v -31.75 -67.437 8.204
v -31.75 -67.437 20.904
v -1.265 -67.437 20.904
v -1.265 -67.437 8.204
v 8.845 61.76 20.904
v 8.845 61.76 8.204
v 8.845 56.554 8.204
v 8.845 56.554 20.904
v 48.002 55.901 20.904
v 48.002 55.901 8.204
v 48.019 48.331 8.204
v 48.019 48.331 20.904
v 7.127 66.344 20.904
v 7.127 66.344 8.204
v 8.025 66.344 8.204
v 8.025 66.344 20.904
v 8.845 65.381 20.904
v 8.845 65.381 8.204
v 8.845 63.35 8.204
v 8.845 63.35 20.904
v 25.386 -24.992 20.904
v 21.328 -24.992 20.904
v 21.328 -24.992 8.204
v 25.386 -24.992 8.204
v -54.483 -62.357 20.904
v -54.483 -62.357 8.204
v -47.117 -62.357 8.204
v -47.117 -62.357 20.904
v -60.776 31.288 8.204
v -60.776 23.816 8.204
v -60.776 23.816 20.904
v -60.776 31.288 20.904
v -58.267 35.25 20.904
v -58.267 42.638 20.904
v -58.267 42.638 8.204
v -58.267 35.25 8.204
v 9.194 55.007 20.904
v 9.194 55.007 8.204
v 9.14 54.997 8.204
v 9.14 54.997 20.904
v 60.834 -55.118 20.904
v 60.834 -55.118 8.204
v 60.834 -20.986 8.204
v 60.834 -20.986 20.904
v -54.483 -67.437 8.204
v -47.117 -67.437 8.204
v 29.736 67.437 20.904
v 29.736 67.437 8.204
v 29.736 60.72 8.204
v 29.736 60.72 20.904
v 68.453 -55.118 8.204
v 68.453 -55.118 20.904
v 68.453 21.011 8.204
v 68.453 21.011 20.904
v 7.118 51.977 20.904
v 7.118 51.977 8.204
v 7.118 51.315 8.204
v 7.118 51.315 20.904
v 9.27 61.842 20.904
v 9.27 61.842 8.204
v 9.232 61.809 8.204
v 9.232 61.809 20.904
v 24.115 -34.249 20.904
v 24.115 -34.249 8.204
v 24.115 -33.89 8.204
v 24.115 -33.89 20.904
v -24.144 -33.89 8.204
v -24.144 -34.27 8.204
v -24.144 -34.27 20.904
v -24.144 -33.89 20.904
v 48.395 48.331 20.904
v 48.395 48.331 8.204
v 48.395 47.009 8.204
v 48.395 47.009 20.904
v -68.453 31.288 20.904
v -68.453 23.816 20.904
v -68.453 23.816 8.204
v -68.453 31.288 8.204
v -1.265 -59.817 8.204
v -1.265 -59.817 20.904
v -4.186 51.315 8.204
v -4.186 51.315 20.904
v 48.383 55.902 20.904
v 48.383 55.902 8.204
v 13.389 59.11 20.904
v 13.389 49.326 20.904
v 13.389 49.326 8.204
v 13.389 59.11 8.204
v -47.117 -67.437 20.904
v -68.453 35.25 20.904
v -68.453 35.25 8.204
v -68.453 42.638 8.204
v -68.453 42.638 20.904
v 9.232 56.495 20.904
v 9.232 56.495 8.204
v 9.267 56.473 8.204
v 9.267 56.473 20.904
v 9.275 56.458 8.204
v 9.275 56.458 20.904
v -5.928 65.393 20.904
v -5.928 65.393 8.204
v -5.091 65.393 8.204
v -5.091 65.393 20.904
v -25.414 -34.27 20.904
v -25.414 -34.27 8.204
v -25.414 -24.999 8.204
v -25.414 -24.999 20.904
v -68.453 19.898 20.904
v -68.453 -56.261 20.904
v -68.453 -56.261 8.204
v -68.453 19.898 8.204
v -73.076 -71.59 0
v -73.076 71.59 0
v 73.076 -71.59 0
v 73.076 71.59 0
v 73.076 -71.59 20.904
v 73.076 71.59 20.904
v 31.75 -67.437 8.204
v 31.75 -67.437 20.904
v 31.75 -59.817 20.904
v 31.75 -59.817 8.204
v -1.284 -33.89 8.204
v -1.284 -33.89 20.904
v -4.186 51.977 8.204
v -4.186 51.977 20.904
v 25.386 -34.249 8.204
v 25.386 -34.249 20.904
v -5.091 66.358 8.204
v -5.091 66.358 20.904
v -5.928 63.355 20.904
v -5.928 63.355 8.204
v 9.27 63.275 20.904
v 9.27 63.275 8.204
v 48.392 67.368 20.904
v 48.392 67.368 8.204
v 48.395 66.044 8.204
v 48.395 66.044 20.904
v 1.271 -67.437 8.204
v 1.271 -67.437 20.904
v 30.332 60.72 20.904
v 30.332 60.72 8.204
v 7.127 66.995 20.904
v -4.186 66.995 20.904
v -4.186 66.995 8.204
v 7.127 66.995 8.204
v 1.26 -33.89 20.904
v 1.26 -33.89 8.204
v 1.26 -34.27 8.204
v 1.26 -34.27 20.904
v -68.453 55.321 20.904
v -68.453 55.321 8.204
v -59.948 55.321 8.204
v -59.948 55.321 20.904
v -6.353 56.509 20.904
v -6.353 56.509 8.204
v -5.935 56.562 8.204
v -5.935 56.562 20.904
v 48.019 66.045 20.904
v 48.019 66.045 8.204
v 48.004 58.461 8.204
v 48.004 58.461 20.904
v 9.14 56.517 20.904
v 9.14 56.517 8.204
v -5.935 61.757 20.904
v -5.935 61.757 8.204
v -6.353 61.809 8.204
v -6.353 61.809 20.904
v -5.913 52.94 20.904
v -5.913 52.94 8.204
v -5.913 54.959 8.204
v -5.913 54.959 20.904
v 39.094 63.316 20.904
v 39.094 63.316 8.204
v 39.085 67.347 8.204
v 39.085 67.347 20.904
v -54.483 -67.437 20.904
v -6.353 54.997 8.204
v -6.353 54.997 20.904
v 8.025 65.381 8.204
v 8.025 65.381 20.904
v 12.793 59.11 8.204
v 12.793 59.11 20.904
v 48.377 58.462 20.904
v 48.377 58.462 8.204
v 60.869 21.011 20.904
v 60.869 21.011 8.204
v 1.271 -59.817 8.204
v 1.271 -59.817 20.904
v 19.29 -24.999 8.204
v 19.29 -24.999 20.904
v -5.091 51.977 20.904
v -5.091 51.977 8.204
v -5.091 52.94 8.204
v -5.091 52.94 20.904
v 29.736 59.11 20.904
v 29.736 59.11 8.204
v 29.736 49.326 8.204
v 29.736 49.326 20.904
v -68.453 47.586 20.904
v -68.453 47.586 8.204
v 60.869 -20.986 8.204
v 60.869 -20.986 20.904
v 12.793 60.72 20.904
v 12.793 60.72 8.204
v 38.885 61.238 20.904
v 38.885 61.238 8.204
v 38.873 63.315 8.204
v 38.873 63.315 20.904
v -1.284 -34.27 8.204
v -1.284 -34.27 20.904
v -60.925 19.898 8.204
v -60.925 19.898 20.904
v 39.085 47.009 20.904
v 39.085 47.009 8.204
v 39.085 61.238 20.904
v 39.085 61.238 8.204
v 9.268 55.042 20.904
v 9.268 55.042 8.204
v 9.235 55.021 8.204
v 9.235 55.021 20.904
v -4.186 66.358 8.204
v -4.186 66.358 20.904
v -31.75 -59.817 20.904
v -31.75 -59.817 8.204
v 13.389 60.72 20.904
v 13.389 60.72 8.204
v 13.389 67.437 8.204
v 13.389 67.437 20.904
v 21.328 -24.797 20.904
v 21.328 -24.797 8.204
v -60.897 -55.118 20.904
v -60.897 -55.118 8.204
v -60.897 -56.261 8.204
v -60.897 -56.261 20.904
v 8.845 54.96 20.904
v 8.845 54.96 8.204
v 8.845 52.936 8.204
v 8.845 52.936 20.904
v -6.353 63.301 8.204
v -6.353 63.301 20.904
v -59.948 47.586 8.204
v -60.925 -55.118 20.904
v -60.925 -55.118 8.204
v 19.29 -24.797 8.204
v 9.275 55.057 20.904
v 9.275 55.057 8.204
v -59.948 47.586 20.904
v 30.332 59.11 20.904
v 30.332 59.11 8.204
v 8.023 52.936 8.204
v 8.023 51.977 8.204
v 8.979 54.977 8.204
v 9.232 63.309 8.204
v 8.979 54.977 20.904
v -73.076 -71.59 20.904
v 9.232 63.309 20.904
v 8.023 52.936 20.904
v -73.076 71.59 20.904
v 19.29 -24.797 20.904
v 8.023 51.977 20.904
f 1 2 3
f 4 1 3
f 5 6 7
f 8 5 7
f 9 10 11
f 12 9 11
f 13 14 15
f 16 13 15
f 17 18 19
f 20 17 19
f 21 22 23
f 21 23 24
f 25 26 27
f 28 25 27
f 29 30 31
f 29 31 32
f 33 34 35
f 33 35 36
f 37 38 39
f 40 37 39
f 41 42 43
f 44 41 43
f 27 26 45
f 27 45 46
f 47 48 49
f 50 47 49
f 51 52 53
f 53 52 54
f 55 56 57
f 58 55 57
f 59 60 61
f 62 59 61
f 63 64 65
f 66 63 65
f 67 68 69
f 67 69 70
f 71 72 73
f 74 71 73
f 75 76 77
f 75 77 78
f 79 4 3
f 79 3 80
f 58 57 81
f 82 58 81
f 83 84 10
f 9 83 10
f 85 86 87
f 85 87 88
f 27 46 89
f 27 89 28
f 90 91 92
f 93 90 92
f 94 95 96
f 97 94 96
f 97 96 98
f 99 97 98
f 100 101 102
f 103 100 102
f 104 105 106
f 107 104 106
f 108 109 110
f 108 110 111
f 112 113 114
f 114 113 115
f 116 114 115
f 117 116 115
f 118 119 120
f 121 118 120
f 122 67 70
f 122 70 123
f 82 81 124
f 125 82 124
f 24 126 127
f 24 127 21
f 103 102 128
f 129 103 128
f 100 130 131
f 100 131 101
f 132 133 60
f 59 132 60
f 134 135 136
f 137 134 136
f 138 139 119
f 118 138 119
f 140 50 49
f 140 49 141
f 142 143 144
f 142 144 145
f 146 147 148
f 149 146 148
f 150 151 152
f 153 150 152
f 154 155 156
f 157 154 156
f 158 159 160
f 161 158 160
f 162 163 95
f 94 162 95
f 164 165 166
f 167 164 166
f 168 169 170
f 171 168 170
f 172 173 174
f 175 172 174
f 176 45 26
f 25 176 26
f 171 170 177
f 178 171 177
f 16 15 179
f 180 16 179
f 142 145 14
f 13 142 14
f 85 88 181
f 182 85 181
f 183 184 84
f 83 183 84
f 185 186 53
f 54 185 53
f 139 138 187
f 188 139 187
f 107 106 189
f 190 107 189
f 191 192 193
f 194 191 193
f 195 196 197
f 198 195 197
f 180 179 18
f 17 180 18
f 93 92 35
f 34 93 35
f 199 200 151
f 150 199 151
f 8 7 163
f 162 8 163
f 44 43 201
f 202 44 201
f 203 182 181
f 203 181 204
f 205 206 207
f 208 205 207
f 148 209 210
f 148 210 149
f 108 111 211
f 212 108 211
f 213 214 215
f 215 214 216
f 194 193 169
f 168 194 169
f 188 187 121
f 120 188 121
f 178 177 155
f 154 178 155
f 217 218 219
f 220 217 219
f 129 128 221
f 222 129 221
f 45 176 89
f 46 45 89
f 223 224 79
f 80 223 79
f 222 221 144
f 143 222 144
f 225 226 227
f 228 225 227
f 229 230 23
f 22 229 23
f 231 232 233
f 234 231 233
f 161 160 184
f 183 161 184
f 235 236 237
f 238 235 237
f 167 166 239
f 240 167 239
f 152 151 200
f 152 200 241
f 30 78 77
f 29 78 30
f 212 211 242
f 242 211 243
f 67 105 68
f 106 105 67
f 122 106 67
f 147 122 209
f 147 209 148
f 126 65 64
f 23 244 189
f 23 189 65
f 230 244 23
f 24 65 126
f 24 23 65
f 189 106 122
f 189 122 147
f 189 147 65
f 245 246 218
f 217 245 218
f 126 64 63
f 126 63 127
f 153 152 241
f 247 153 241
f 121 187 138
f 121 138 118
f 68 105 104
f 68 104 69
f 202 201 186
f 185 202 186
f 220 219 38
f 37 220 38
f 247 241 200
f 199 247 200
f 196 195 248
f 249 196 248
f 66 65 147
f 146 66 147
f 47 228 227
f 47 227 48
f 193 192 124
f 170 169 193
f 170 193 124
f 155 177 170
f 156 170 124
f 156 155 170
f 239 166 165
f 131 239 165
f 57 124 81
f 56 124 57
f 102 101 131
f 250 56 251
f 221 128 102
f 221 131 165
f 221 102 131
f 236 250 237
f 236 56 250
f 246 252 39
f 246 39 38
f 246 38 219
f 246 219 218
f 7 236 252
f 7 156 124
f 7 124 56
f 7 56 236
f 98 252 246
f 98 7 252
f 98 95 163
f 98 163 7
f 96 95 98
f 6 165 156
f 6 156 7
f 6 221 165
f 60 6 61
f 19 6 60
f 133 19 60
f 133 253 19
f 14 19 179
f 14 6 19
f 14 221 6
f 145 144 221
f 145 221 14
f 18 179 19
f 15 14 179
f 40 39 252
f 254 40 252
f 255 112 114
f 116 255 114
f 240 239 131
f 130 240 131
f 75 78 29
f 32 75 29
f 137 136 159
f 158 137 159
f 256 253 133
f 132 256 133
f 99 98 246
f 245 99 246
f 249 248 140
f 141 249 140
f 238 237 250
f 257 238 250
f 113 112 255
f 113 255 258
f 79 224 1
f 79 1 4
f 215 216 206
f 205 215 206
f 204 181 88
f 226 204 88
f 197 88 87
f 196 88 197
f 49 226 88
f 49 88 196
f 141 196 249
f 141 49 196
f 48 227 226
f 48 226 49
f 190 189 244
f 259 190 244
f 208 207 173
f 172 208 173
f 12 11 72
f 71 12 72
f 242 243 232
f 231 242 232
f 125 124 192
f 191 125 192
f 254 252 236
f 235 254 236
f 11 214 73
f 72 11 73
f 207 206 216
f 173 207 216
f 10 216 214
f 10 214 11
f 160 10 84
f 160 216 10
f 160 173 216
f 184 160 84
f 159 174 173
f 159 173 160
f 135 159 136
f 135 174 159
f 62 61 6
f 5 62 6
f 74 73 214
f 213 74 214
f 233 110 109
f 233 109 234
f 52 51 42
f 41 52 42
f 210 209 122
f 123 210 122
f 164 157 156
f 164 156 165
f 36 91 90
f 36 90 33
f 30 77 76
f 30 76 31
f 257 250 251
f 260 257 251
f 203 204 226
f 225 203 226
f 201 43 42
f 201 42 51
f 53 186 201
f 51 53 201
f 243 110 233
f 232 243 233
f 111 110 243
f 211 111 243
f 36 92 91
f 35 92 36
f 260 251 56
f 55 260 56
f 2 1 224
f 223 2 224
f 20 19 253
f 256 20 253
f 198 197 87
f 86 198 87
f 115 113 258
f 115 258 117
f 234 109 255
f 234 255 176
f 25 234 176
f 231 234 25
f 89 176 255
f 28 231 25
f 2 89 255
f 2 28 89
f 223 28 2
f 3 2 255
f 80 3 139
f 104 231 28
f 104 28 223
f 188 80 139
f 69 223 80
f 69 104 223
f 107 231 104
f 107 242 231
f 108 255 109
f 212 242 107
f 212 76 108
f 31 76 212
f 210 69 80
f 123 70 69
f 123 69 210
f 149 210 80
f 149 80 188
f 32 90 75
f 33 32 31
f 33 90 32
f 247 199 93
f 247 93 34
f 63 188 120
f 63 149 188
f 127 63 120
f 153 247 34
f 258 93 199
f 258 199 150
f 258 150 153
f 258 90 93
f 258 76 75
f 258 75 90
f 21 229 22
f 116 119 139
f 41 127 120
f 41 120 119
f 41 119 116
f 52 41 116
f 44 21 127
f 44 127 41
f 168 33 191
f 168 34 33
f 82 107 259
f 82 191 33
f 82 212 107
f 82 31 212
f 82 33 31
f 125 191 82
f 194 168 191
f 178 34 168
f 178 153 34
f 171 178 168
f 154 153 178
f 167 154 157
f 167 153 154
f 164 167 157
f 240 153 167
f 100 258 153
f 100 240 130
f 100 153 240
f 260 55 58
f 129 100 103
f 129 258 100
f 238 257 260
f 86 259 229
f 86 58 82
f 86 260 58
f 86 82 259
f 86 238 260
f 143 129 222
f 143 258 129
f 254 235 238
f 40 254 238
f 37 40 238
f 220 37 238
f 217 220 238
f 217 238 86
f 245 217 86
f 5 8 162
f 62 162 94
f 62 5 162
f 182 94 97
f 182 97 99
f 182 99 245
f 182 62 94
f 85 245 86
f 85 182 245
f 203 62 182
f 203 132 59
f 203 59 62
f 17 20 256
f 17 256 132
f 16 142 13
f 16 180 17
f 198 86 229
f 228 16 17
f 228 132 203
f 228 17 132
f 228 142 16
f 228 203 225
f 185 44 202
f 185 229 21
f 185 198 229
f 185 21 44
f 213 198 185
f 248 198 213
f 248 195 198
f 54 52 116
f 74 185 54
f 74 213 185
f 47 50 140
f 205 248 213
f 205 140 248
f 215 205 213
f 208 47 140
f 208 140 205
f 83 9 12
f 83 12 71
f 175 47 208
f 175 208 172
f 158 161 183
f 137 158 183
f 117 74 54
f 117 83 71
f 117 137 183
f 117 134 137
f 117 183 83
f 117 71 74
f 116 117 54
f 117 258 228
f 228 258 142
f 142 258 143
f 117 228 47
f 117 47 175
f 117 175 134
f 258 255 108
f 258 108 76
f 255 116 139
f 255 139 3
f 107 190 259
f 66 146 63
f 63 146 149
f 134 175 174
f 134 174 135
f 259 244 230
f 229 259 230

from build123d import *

# Parameters (mm, degrees)
F0_W      = 146.1516
F0_H      = 143.1798
F1_DEPTH  = 20.9042
F2_W      = 136.906
F2_H      = 134.874
F3_DEPTH  = 12.7
F4_W      = 13.97
F4_H      = 11.176
F5_DEPTH  = 12.7
F6_W      = 22.733
F6_H      = 6.096
F7_DEPTH  = 12.7
F8_W      = 15.367
F8_H      = 5.08
F9_DEPTH  = 12.7
F10_W     = 36.703
F10_H     = 12.319
F11_DEPTH = 12.7
F13_DEPTH = 12.7
F14_W     = 22.83968
F14_H     = 21.22805
F15_DEPTH = 12.7
F16_W     = 3.0399242607
F16_H     = 20.8479667597
F17_DEPTH = 12.7
F19_DEPTH = 12.7
F20_W     = 0.0204666441
F20_H     = 21.22805
F21_DEPTH = 12.7
F22_W     = 36.7188937962
F22_H     = 20.8685005598
F23_DEPTH = 12.7
F24_W     = 35.306
F24_H     = 13.2634267211
F25_DEPTH = 12.7
F27_DEPTH = 12.7
F28_W     = 1.4742958935
F28_H     = 20.8479667597
F29_DEPTH = 12.7
F30_W     = 0.2049181255
F30_H     = 13.2839605212
F31_DEPTH = 12.7
F32_W     = 50.9417812916
F32_H     = 3.8105603307
F33_DEPTH = 12.7
F34_W     = 0.1417576911
F34_H     = 9.2577636242
F35_DEPTH = 12.7
F36_W     = 44.7041876614
F36_H     = 0.2025440335
F37_DEPTH = 12.7
F38_W     = 8.9374343662
F38_H     = 3.9174016565
F39_DEPTH = 12.7
F40_W     = 127.9685656338
F40_H     = 2.8044246137
F41_DEPTH = 12.7
F42_W     = 120.384439826
F42_H     = 1.1129770428
F43_DEPTH = 12.7
F45_DEPTH = 12.7
F46_W     = 12.3281155104
F46_H     = 3.9624
F47_DEPTH = 12.7
F48_W     = 4.6508648958
F48_H     = 7.4722463233
F49_DEPTH = 12.7
F51_DEPTH = 12.7
F52_W     = 0.5965952
F52_H     = 1.6107708216
F53_DEPTH = 12.7
F55_DEPTH = 12.7
F57_DEPTH = 12.7
F58_DEPTH = 12.7
F59_W     = 18.6266698875
F59_H     = 19.8514753814
F60_DEPTH = 12.7
F61_W     = 2.536320244
F61_H     = 7.62
F62_DEPTH = 12.7


with BuildPart() as f1:
    # F0 (on Top) → F1 (new body)
    with BuildSketch(Plane.XY):
        Rectangle(F0_W, F0_H)
    extrude(amount=F1_DEPTH)

    # F2 (on face) → F3 (cut)
    with BuildSketch(Plane.XY.offset(20.9042)):
        Rectangle(F2_W, F2_H)
    extrude(amount=-F3_DEPTH, mode=Mode.SUBTRACT)

    # F4 (on face) → F5 (join)
    with BuildSketch(Plane.XY.offset(8.2042)):
        with Locations((-61.468, -61.849)):
            Rectangle(F4_W, F4_H)
    extrude(amount=F5_DEPTH)

    # F6 (on face) → F7 (join)
    with BuildSketch(Plane.XY.offset(8.2042)):
        with Locations((-43.1165, -59.309)):
            Rectangle(F6_W, F6_H)
    extrude(amount=F7_DEPTH)

    # F8 (on face) → F9 (join)
    with BuildSketch(Plane.XY.offset(8.2042)):
        with Locations((-39.4335, -64.897)):
            Rectangle(F8_W, F8_H)
    extrude(amount=F9_DEPTH)

    # F10 (on face) → F11 (join)
    with BuildSketch(Plane.XY.offset(8.2042)):
        with Locations((50.1015, -61.2775)):
            Rectangle(F10_W, F10_H)
    extrude(amount=F11_DEPTH)

    # F12 (on face) → F13 (join)
    with BuildSketch(Plane.XY.offset(8.2042)):
        Polygon((31.75, -56.261), (31.75, -55.118), (-60.8972720802, -55.118), (-60.8972720802, -56.261), (-31.75, -56.261), (-31.75, -59.817), (31.75, -59.817), (31.75, -57.820610702), align=None)
    extrude(amount=F13_DEPTH)

    # F14 (on face) → F15 (join)
    with BuildSketch(Plane.XY.offset(8.2042)):
        with Locations((-12.7041547344, -44.503975)):
            Rectangle(F14_W, F14_H)
    extrude(amount=F15_DEPTH)

    # F16 (on face) → F17 (join)
    with BuildSketch(Plane.XY.offset(8.2042)):
        with Locations((0.235647396, -44.6940166202)):
            Rectangle(F16_W, F16_H)
    extrude(amount=F17_DEPTH)

    # F18 (on face) → F19 (join)
    with BuildSketch(Plane.XY.offset(8.2042)):
        Polygon((24.1150483489, -33.88995), (1.2599385809, -33.88995), (1.2599385809, -34.2700332403), (1.7556095263, -34.2700332403), (1.7556095263, -55.118), (24.1150483489, -55.118), align=None)
    extrude(amount=F19_DEPTH)

    # F20 (on face) → F21 (join)
    with BuildSketch(Plane.XY.offset(8.2042)):
        with Locations((-24.1342280564, -44.503975)):
            Rectangle(F20_W, F20_H)
    extrude(amount=F21_DEPTH)

    # F22 (on face) → F23 (join)
    with BuildSketch(Plane.XY.offset(8.2042)):
        with Locations((42.474495247, -44.6837497201)):
            Rectangle(F22_W, F22_H)
    extrude(amount=F23_DEPTH)

    # F24 (on face) → F25 (join)
    with BuildSketch(Plane.XY.offset(8.2042)):
        with Locations((43.1809421451, -27.6177860796)):
            Rectangle(F24_W, F24_H)
    extrude(amount=F25_DEPTH)

    # F26 (on face) → F27 (join)
    with BuildSketch(Plane.XY.offset(8.2042)):
        Polygon((-25.618757272, -20.9860727191), (-60.924757272, -20.9860727191), (-60.924757272, -55.118), (-60.8972720802, -55.118), (-25.618757272, -55.118), align=None)
    extrude(amount=F27_DEPTH)

    # F28 (on face) → F29 (join)
    with BuildSketch(Plane.XY.offset(8.2042)):
        with Locations((-24.8816093252, -44.6940166202)):
            Rectangle(F28_W, F28_H)
    extrude(amount=F29_DEPTH)

    # F30 (on face) → F31 (join)
    with BuildSketch(Plane.XY.offset(8.2042)):
        with Locations((-25.5162982092, -27.6280529797)):
            Rectangle(F30_W, F30_H)
    extrude(amount=F31_DEPTH)

    # F32 (on face) → F33 (join)
    with BuildSketch(Plane.XY.offset(8.2042)):
        with Locations((0.0570514993, -22.8913528845)):
            Rectangle(F32_W, F32_H)
    extrude(amount=F33_DEPTH)

    # F34 (on face) → F35 (join)
    with BuildSketch(Plane.XY.offset(8.2042)):
        with Locations((25.4570632995, -29.6206176281)):
            Rectangle(F34_W, F34_H)
        Polygon((25.5279421451, -24.991735816), (25.5279421451, -24.7966330498), (21.3277284056, -24.7966330498), (21.3277284056, -24.991735816), (25.386184454, -24.991735816), align=None)
    extrude(amount=F35_DEPTH)

    # F36 (on face) → F37 (join)
    with BuildSketch(Plane.XY.offset(8.2042)):
        with Locations((-3.0617453158, -24.8979050666)):
            Rectangle(F36_W, F36_H)
    extrude(amount=F37_DEPTH)

    # F38 (on face) → F39 (join)
    with BuildSketch(Plane.XY.offset(8.2042)):
        with Locations((-63.9842828169, 21.8571154401)):
            Rectangle(F38_W, F38_H)
    extrude(amount=F39_DEPTH)

    # F40 (on face) → F41 (join)
    with BuildSketch(Plane.XY.offset(8.2042)):
        with Locations((4.4687171831, 22.4136039615)):
            Rectangle(F40_W, F40_H)
    extrude(amount=F41_DEPTH)

    # F42 (on face) → F43 (join)
    with BuildSketch(Plane.XY.offset(8.2042)):
        with Locations((0.6766542792, 20.4549031332)):
            Rectangle(F42_W, F42_H)
    extrude(amount=F43_DEPTH)

    # F44 (on face) → F45 (join)
    with BuildSketch(Plane.XY.offset(8.2042)):
        Polygon((-60.924757272, 19.8984146118), (-60.924757272, -20.9860727191), (60.8339421451, -20.9860727191), (60.8688741922, -20.9860727191), (60.8688741922, 19.8984146118), align=None)
    extrude(amount=F45_DEPTH)

    # F46 (on face) → F47 (join)
    with BuildSketch(Plane.XY.offset(8.2042)):
        with Locations((-62.2889422448, 33.2692625916)):
            Rectangle(F46_W, F46_H)
    extrude(amount=F47_DEPTH)

    # F48 (on face) → F49 (join)
    with BuildSketch(Plane.XY.offset(8.2042)):
        Polygon((-59.9482320249, 47.5855246186), (-56.1248844896, 47.5855246186), (-7.6236505993, 47.5855246186), (-7.6236505993, 67.437), (-68.453, 67.437), (-68.453, 55.3214401007), (-59.9482320249, 55.3214401007), align=None)
        Polygon((-58.2667700946, 42.6384061575), (-58.2667700946, 35.2504625916), (-56.1248844896, 35.2504625916), (-56.1248844896, 47.5855246186), (-59.9482320249, 47.5855246186), (-68.453, 47.5855246186), (-68.453, 42.6384061575), align=None)
        with Locations((-58.4503169375, 27.55193943)):
            Rectangle(F48_W, F48_H)
    extrude(amount=F49_DEPTH)

    # F50 (on face) → F51 (join)
    with BuildSketch(Plane.XY.offset(8.2042)):
        Polygon((13.3893499151, 66.3282424212), (13.3893499151, 66.38789922), (13.3893499151, 67.437), (11.0030192882, 67.437), (11.0030192882, 47.5855246186), (36.7157235742, 47.5855246186), (36.7157235742, 67.437), (29.7357104719, 67.437), (29.7357104719, 66.3282424212), (29.7357104719, 49.3256412446), (13.3893499151, 49.3256412446), (13.3893499151, 59.1095946729), (12.7927670255, 59.1095946729), (12.7927670255, 60.7203654945), (13.3893499151, 60.7203654945), align=None)
    extrude(amount=F51_DEPTH)

    # F52 (on face) → F53 (cut)
    with BuildSketch(Plane.XY.offset(20.9042)):
        with Locations((30.0340080719, 59.9149800837)):
            Rectangle(F52_W, F52_H)
    extrude(amount=-F53_DEPTH, mode=Mode.SUBTRACT)

    # F54 (on face) → F55 (join)
    with BuildSketch(Plane.XY.offset(8.2042)):
        Polygon((36.7157235742, 67.437), (36.7157235742, 61.2382255495), (36.7157235742, 47.5855246186), (36.7157235742, 44.6023866534), (68.453, 44.6733043295), (68.453, 67.437), align=None)
        Polygon((39.0854626894, 61.2382255495), (38.8847962022, 61.2382255495), (38.873040642, 63.3154974574), (39.0944701822, 63.3159922468), (39.0854626894, 67.3470505811), (48.391856432, 67.3678459326), (48.3948141336, 66.0442070147), (48.0193123221, 66.044986248), (48.0035748597, 58.4613198814), (48.376891034, 58.462154065), (48.3826112146, 55.9022428945), (48.0023957789, 55.9013932943), (48.0193123221, 48.3308546245), (48.3948141336, 48.3308546245), (48.3948141336, 47.008857131), (39.0854626894, 47.008857131), align=None, mode=Mode.SUBTRACT)
    extrude(amount=F55_DEPTH)

    # F56 (on face) → F57 (join)
    with BuildSketch(Plane.XY.offset(8.2042)):
        Polygon((-56.1248844896, 44.6023866534), (36.7157235742, 44.6023866534), (36.7157235742, 47.5855246186), (11.0030192882, 47.5855246186), (-7.6236505993, 47.5855246186), (-56.1248844896, 47.5855246186), align=None)
    extrude(amount=F57_DEPTH)

    # F58 (add): a face of the model
    f58_faces = [f1.faces().sort_by_distance(p)[0] for p in [
        (6.1865200926, 34.2136264879, 8.2042),
    ]]
    extrude(f58_faces, amount=F58_DEPTH)

    # F59 (on face) → F60 (join)
    with BuildSketch(Plane.XY.offset(8.2042)):
        with Locations((1.6896843445, 57.5112623093)):
            Rectangle(F59_W, F59_H)
        Polygon((-5.9129633009, 52.9398955405), (-5.9129633009, 54.9593605101), (-6.353115936, 54.9970567226), (-6.353115936, 56.5094996253), (-5.934735491, 56.5619803965), (-5.934735491, 61.7567235961), (-6.353115936, 61.8088580668), (-6.353115936, 63.3012766497), (-5.9279869311, 63.3546039462), (-5.9279869311, 65.3928667307), (-5.0910133868, 65.3928667307), (-5.0910133868, 66.3584321737), (-4.1863322258, 66.3584321737), (-4.1863322258, 66.9948086143), (7.1273995563, 66.9948086143), (7.1273995563, 66.3435682654), (8.0246776342, 66.3435682654), (8.0246776342, 65.3805136681), (8.8445162401, 65.3805136681), (8.8445162401, 63.3501261473), (9.2323757708, 63.3093193173), (9.2695318162, 63.2747858763), (9.2695318162, 61.8418827653), (9.2323757708, 61.8088580668), (8.8445162401, 61.7602057755), (8.8445162401, 56.5535761416), (9.1401832178, 56.5167330205), (9.2323757708, 56.4947389066), (9.2673106119, 56.4729869366), (9.2748431489, 56.4584843814), (9.2748431489, 55.0567209721), (9.2683695257, 55.0422929227), (9.234521538, 55.0210215151), (9.1941989958, 55.0067797303), (9.1401832178, 54.9970567226), (8.9794592932, 54.9773350358), (8.8445162401, 54.9603402615), (8.8445162401, 52.935667336), (8.0229612067, 52.935667336), (8.0229612067, 51.9765391946), (7.1176989004, 51.9765391946), (7.1176989004, 51.3154454529), (-4.1863322258, 51.3154454529), (-4.1863322258, 51.9765391946), (-5.0910133868, 51.9765391946), (-5.0910133868, 52.380554378), (-5.0910133868, 52.9398955405), align=None, mode=Mode.SUBTRACT)
    extrude(amount=F60_DEPTH)

    # F61 (on face) → F62 (join)
    with BuildSketch(Plane.XY.offset(8.2042)):
        with Locations((0.0027513015, -63.627)):
            Rectangle(F61_W, F61_H)
    extrude(amount=F62_DEPTH)


solid = f1.part
